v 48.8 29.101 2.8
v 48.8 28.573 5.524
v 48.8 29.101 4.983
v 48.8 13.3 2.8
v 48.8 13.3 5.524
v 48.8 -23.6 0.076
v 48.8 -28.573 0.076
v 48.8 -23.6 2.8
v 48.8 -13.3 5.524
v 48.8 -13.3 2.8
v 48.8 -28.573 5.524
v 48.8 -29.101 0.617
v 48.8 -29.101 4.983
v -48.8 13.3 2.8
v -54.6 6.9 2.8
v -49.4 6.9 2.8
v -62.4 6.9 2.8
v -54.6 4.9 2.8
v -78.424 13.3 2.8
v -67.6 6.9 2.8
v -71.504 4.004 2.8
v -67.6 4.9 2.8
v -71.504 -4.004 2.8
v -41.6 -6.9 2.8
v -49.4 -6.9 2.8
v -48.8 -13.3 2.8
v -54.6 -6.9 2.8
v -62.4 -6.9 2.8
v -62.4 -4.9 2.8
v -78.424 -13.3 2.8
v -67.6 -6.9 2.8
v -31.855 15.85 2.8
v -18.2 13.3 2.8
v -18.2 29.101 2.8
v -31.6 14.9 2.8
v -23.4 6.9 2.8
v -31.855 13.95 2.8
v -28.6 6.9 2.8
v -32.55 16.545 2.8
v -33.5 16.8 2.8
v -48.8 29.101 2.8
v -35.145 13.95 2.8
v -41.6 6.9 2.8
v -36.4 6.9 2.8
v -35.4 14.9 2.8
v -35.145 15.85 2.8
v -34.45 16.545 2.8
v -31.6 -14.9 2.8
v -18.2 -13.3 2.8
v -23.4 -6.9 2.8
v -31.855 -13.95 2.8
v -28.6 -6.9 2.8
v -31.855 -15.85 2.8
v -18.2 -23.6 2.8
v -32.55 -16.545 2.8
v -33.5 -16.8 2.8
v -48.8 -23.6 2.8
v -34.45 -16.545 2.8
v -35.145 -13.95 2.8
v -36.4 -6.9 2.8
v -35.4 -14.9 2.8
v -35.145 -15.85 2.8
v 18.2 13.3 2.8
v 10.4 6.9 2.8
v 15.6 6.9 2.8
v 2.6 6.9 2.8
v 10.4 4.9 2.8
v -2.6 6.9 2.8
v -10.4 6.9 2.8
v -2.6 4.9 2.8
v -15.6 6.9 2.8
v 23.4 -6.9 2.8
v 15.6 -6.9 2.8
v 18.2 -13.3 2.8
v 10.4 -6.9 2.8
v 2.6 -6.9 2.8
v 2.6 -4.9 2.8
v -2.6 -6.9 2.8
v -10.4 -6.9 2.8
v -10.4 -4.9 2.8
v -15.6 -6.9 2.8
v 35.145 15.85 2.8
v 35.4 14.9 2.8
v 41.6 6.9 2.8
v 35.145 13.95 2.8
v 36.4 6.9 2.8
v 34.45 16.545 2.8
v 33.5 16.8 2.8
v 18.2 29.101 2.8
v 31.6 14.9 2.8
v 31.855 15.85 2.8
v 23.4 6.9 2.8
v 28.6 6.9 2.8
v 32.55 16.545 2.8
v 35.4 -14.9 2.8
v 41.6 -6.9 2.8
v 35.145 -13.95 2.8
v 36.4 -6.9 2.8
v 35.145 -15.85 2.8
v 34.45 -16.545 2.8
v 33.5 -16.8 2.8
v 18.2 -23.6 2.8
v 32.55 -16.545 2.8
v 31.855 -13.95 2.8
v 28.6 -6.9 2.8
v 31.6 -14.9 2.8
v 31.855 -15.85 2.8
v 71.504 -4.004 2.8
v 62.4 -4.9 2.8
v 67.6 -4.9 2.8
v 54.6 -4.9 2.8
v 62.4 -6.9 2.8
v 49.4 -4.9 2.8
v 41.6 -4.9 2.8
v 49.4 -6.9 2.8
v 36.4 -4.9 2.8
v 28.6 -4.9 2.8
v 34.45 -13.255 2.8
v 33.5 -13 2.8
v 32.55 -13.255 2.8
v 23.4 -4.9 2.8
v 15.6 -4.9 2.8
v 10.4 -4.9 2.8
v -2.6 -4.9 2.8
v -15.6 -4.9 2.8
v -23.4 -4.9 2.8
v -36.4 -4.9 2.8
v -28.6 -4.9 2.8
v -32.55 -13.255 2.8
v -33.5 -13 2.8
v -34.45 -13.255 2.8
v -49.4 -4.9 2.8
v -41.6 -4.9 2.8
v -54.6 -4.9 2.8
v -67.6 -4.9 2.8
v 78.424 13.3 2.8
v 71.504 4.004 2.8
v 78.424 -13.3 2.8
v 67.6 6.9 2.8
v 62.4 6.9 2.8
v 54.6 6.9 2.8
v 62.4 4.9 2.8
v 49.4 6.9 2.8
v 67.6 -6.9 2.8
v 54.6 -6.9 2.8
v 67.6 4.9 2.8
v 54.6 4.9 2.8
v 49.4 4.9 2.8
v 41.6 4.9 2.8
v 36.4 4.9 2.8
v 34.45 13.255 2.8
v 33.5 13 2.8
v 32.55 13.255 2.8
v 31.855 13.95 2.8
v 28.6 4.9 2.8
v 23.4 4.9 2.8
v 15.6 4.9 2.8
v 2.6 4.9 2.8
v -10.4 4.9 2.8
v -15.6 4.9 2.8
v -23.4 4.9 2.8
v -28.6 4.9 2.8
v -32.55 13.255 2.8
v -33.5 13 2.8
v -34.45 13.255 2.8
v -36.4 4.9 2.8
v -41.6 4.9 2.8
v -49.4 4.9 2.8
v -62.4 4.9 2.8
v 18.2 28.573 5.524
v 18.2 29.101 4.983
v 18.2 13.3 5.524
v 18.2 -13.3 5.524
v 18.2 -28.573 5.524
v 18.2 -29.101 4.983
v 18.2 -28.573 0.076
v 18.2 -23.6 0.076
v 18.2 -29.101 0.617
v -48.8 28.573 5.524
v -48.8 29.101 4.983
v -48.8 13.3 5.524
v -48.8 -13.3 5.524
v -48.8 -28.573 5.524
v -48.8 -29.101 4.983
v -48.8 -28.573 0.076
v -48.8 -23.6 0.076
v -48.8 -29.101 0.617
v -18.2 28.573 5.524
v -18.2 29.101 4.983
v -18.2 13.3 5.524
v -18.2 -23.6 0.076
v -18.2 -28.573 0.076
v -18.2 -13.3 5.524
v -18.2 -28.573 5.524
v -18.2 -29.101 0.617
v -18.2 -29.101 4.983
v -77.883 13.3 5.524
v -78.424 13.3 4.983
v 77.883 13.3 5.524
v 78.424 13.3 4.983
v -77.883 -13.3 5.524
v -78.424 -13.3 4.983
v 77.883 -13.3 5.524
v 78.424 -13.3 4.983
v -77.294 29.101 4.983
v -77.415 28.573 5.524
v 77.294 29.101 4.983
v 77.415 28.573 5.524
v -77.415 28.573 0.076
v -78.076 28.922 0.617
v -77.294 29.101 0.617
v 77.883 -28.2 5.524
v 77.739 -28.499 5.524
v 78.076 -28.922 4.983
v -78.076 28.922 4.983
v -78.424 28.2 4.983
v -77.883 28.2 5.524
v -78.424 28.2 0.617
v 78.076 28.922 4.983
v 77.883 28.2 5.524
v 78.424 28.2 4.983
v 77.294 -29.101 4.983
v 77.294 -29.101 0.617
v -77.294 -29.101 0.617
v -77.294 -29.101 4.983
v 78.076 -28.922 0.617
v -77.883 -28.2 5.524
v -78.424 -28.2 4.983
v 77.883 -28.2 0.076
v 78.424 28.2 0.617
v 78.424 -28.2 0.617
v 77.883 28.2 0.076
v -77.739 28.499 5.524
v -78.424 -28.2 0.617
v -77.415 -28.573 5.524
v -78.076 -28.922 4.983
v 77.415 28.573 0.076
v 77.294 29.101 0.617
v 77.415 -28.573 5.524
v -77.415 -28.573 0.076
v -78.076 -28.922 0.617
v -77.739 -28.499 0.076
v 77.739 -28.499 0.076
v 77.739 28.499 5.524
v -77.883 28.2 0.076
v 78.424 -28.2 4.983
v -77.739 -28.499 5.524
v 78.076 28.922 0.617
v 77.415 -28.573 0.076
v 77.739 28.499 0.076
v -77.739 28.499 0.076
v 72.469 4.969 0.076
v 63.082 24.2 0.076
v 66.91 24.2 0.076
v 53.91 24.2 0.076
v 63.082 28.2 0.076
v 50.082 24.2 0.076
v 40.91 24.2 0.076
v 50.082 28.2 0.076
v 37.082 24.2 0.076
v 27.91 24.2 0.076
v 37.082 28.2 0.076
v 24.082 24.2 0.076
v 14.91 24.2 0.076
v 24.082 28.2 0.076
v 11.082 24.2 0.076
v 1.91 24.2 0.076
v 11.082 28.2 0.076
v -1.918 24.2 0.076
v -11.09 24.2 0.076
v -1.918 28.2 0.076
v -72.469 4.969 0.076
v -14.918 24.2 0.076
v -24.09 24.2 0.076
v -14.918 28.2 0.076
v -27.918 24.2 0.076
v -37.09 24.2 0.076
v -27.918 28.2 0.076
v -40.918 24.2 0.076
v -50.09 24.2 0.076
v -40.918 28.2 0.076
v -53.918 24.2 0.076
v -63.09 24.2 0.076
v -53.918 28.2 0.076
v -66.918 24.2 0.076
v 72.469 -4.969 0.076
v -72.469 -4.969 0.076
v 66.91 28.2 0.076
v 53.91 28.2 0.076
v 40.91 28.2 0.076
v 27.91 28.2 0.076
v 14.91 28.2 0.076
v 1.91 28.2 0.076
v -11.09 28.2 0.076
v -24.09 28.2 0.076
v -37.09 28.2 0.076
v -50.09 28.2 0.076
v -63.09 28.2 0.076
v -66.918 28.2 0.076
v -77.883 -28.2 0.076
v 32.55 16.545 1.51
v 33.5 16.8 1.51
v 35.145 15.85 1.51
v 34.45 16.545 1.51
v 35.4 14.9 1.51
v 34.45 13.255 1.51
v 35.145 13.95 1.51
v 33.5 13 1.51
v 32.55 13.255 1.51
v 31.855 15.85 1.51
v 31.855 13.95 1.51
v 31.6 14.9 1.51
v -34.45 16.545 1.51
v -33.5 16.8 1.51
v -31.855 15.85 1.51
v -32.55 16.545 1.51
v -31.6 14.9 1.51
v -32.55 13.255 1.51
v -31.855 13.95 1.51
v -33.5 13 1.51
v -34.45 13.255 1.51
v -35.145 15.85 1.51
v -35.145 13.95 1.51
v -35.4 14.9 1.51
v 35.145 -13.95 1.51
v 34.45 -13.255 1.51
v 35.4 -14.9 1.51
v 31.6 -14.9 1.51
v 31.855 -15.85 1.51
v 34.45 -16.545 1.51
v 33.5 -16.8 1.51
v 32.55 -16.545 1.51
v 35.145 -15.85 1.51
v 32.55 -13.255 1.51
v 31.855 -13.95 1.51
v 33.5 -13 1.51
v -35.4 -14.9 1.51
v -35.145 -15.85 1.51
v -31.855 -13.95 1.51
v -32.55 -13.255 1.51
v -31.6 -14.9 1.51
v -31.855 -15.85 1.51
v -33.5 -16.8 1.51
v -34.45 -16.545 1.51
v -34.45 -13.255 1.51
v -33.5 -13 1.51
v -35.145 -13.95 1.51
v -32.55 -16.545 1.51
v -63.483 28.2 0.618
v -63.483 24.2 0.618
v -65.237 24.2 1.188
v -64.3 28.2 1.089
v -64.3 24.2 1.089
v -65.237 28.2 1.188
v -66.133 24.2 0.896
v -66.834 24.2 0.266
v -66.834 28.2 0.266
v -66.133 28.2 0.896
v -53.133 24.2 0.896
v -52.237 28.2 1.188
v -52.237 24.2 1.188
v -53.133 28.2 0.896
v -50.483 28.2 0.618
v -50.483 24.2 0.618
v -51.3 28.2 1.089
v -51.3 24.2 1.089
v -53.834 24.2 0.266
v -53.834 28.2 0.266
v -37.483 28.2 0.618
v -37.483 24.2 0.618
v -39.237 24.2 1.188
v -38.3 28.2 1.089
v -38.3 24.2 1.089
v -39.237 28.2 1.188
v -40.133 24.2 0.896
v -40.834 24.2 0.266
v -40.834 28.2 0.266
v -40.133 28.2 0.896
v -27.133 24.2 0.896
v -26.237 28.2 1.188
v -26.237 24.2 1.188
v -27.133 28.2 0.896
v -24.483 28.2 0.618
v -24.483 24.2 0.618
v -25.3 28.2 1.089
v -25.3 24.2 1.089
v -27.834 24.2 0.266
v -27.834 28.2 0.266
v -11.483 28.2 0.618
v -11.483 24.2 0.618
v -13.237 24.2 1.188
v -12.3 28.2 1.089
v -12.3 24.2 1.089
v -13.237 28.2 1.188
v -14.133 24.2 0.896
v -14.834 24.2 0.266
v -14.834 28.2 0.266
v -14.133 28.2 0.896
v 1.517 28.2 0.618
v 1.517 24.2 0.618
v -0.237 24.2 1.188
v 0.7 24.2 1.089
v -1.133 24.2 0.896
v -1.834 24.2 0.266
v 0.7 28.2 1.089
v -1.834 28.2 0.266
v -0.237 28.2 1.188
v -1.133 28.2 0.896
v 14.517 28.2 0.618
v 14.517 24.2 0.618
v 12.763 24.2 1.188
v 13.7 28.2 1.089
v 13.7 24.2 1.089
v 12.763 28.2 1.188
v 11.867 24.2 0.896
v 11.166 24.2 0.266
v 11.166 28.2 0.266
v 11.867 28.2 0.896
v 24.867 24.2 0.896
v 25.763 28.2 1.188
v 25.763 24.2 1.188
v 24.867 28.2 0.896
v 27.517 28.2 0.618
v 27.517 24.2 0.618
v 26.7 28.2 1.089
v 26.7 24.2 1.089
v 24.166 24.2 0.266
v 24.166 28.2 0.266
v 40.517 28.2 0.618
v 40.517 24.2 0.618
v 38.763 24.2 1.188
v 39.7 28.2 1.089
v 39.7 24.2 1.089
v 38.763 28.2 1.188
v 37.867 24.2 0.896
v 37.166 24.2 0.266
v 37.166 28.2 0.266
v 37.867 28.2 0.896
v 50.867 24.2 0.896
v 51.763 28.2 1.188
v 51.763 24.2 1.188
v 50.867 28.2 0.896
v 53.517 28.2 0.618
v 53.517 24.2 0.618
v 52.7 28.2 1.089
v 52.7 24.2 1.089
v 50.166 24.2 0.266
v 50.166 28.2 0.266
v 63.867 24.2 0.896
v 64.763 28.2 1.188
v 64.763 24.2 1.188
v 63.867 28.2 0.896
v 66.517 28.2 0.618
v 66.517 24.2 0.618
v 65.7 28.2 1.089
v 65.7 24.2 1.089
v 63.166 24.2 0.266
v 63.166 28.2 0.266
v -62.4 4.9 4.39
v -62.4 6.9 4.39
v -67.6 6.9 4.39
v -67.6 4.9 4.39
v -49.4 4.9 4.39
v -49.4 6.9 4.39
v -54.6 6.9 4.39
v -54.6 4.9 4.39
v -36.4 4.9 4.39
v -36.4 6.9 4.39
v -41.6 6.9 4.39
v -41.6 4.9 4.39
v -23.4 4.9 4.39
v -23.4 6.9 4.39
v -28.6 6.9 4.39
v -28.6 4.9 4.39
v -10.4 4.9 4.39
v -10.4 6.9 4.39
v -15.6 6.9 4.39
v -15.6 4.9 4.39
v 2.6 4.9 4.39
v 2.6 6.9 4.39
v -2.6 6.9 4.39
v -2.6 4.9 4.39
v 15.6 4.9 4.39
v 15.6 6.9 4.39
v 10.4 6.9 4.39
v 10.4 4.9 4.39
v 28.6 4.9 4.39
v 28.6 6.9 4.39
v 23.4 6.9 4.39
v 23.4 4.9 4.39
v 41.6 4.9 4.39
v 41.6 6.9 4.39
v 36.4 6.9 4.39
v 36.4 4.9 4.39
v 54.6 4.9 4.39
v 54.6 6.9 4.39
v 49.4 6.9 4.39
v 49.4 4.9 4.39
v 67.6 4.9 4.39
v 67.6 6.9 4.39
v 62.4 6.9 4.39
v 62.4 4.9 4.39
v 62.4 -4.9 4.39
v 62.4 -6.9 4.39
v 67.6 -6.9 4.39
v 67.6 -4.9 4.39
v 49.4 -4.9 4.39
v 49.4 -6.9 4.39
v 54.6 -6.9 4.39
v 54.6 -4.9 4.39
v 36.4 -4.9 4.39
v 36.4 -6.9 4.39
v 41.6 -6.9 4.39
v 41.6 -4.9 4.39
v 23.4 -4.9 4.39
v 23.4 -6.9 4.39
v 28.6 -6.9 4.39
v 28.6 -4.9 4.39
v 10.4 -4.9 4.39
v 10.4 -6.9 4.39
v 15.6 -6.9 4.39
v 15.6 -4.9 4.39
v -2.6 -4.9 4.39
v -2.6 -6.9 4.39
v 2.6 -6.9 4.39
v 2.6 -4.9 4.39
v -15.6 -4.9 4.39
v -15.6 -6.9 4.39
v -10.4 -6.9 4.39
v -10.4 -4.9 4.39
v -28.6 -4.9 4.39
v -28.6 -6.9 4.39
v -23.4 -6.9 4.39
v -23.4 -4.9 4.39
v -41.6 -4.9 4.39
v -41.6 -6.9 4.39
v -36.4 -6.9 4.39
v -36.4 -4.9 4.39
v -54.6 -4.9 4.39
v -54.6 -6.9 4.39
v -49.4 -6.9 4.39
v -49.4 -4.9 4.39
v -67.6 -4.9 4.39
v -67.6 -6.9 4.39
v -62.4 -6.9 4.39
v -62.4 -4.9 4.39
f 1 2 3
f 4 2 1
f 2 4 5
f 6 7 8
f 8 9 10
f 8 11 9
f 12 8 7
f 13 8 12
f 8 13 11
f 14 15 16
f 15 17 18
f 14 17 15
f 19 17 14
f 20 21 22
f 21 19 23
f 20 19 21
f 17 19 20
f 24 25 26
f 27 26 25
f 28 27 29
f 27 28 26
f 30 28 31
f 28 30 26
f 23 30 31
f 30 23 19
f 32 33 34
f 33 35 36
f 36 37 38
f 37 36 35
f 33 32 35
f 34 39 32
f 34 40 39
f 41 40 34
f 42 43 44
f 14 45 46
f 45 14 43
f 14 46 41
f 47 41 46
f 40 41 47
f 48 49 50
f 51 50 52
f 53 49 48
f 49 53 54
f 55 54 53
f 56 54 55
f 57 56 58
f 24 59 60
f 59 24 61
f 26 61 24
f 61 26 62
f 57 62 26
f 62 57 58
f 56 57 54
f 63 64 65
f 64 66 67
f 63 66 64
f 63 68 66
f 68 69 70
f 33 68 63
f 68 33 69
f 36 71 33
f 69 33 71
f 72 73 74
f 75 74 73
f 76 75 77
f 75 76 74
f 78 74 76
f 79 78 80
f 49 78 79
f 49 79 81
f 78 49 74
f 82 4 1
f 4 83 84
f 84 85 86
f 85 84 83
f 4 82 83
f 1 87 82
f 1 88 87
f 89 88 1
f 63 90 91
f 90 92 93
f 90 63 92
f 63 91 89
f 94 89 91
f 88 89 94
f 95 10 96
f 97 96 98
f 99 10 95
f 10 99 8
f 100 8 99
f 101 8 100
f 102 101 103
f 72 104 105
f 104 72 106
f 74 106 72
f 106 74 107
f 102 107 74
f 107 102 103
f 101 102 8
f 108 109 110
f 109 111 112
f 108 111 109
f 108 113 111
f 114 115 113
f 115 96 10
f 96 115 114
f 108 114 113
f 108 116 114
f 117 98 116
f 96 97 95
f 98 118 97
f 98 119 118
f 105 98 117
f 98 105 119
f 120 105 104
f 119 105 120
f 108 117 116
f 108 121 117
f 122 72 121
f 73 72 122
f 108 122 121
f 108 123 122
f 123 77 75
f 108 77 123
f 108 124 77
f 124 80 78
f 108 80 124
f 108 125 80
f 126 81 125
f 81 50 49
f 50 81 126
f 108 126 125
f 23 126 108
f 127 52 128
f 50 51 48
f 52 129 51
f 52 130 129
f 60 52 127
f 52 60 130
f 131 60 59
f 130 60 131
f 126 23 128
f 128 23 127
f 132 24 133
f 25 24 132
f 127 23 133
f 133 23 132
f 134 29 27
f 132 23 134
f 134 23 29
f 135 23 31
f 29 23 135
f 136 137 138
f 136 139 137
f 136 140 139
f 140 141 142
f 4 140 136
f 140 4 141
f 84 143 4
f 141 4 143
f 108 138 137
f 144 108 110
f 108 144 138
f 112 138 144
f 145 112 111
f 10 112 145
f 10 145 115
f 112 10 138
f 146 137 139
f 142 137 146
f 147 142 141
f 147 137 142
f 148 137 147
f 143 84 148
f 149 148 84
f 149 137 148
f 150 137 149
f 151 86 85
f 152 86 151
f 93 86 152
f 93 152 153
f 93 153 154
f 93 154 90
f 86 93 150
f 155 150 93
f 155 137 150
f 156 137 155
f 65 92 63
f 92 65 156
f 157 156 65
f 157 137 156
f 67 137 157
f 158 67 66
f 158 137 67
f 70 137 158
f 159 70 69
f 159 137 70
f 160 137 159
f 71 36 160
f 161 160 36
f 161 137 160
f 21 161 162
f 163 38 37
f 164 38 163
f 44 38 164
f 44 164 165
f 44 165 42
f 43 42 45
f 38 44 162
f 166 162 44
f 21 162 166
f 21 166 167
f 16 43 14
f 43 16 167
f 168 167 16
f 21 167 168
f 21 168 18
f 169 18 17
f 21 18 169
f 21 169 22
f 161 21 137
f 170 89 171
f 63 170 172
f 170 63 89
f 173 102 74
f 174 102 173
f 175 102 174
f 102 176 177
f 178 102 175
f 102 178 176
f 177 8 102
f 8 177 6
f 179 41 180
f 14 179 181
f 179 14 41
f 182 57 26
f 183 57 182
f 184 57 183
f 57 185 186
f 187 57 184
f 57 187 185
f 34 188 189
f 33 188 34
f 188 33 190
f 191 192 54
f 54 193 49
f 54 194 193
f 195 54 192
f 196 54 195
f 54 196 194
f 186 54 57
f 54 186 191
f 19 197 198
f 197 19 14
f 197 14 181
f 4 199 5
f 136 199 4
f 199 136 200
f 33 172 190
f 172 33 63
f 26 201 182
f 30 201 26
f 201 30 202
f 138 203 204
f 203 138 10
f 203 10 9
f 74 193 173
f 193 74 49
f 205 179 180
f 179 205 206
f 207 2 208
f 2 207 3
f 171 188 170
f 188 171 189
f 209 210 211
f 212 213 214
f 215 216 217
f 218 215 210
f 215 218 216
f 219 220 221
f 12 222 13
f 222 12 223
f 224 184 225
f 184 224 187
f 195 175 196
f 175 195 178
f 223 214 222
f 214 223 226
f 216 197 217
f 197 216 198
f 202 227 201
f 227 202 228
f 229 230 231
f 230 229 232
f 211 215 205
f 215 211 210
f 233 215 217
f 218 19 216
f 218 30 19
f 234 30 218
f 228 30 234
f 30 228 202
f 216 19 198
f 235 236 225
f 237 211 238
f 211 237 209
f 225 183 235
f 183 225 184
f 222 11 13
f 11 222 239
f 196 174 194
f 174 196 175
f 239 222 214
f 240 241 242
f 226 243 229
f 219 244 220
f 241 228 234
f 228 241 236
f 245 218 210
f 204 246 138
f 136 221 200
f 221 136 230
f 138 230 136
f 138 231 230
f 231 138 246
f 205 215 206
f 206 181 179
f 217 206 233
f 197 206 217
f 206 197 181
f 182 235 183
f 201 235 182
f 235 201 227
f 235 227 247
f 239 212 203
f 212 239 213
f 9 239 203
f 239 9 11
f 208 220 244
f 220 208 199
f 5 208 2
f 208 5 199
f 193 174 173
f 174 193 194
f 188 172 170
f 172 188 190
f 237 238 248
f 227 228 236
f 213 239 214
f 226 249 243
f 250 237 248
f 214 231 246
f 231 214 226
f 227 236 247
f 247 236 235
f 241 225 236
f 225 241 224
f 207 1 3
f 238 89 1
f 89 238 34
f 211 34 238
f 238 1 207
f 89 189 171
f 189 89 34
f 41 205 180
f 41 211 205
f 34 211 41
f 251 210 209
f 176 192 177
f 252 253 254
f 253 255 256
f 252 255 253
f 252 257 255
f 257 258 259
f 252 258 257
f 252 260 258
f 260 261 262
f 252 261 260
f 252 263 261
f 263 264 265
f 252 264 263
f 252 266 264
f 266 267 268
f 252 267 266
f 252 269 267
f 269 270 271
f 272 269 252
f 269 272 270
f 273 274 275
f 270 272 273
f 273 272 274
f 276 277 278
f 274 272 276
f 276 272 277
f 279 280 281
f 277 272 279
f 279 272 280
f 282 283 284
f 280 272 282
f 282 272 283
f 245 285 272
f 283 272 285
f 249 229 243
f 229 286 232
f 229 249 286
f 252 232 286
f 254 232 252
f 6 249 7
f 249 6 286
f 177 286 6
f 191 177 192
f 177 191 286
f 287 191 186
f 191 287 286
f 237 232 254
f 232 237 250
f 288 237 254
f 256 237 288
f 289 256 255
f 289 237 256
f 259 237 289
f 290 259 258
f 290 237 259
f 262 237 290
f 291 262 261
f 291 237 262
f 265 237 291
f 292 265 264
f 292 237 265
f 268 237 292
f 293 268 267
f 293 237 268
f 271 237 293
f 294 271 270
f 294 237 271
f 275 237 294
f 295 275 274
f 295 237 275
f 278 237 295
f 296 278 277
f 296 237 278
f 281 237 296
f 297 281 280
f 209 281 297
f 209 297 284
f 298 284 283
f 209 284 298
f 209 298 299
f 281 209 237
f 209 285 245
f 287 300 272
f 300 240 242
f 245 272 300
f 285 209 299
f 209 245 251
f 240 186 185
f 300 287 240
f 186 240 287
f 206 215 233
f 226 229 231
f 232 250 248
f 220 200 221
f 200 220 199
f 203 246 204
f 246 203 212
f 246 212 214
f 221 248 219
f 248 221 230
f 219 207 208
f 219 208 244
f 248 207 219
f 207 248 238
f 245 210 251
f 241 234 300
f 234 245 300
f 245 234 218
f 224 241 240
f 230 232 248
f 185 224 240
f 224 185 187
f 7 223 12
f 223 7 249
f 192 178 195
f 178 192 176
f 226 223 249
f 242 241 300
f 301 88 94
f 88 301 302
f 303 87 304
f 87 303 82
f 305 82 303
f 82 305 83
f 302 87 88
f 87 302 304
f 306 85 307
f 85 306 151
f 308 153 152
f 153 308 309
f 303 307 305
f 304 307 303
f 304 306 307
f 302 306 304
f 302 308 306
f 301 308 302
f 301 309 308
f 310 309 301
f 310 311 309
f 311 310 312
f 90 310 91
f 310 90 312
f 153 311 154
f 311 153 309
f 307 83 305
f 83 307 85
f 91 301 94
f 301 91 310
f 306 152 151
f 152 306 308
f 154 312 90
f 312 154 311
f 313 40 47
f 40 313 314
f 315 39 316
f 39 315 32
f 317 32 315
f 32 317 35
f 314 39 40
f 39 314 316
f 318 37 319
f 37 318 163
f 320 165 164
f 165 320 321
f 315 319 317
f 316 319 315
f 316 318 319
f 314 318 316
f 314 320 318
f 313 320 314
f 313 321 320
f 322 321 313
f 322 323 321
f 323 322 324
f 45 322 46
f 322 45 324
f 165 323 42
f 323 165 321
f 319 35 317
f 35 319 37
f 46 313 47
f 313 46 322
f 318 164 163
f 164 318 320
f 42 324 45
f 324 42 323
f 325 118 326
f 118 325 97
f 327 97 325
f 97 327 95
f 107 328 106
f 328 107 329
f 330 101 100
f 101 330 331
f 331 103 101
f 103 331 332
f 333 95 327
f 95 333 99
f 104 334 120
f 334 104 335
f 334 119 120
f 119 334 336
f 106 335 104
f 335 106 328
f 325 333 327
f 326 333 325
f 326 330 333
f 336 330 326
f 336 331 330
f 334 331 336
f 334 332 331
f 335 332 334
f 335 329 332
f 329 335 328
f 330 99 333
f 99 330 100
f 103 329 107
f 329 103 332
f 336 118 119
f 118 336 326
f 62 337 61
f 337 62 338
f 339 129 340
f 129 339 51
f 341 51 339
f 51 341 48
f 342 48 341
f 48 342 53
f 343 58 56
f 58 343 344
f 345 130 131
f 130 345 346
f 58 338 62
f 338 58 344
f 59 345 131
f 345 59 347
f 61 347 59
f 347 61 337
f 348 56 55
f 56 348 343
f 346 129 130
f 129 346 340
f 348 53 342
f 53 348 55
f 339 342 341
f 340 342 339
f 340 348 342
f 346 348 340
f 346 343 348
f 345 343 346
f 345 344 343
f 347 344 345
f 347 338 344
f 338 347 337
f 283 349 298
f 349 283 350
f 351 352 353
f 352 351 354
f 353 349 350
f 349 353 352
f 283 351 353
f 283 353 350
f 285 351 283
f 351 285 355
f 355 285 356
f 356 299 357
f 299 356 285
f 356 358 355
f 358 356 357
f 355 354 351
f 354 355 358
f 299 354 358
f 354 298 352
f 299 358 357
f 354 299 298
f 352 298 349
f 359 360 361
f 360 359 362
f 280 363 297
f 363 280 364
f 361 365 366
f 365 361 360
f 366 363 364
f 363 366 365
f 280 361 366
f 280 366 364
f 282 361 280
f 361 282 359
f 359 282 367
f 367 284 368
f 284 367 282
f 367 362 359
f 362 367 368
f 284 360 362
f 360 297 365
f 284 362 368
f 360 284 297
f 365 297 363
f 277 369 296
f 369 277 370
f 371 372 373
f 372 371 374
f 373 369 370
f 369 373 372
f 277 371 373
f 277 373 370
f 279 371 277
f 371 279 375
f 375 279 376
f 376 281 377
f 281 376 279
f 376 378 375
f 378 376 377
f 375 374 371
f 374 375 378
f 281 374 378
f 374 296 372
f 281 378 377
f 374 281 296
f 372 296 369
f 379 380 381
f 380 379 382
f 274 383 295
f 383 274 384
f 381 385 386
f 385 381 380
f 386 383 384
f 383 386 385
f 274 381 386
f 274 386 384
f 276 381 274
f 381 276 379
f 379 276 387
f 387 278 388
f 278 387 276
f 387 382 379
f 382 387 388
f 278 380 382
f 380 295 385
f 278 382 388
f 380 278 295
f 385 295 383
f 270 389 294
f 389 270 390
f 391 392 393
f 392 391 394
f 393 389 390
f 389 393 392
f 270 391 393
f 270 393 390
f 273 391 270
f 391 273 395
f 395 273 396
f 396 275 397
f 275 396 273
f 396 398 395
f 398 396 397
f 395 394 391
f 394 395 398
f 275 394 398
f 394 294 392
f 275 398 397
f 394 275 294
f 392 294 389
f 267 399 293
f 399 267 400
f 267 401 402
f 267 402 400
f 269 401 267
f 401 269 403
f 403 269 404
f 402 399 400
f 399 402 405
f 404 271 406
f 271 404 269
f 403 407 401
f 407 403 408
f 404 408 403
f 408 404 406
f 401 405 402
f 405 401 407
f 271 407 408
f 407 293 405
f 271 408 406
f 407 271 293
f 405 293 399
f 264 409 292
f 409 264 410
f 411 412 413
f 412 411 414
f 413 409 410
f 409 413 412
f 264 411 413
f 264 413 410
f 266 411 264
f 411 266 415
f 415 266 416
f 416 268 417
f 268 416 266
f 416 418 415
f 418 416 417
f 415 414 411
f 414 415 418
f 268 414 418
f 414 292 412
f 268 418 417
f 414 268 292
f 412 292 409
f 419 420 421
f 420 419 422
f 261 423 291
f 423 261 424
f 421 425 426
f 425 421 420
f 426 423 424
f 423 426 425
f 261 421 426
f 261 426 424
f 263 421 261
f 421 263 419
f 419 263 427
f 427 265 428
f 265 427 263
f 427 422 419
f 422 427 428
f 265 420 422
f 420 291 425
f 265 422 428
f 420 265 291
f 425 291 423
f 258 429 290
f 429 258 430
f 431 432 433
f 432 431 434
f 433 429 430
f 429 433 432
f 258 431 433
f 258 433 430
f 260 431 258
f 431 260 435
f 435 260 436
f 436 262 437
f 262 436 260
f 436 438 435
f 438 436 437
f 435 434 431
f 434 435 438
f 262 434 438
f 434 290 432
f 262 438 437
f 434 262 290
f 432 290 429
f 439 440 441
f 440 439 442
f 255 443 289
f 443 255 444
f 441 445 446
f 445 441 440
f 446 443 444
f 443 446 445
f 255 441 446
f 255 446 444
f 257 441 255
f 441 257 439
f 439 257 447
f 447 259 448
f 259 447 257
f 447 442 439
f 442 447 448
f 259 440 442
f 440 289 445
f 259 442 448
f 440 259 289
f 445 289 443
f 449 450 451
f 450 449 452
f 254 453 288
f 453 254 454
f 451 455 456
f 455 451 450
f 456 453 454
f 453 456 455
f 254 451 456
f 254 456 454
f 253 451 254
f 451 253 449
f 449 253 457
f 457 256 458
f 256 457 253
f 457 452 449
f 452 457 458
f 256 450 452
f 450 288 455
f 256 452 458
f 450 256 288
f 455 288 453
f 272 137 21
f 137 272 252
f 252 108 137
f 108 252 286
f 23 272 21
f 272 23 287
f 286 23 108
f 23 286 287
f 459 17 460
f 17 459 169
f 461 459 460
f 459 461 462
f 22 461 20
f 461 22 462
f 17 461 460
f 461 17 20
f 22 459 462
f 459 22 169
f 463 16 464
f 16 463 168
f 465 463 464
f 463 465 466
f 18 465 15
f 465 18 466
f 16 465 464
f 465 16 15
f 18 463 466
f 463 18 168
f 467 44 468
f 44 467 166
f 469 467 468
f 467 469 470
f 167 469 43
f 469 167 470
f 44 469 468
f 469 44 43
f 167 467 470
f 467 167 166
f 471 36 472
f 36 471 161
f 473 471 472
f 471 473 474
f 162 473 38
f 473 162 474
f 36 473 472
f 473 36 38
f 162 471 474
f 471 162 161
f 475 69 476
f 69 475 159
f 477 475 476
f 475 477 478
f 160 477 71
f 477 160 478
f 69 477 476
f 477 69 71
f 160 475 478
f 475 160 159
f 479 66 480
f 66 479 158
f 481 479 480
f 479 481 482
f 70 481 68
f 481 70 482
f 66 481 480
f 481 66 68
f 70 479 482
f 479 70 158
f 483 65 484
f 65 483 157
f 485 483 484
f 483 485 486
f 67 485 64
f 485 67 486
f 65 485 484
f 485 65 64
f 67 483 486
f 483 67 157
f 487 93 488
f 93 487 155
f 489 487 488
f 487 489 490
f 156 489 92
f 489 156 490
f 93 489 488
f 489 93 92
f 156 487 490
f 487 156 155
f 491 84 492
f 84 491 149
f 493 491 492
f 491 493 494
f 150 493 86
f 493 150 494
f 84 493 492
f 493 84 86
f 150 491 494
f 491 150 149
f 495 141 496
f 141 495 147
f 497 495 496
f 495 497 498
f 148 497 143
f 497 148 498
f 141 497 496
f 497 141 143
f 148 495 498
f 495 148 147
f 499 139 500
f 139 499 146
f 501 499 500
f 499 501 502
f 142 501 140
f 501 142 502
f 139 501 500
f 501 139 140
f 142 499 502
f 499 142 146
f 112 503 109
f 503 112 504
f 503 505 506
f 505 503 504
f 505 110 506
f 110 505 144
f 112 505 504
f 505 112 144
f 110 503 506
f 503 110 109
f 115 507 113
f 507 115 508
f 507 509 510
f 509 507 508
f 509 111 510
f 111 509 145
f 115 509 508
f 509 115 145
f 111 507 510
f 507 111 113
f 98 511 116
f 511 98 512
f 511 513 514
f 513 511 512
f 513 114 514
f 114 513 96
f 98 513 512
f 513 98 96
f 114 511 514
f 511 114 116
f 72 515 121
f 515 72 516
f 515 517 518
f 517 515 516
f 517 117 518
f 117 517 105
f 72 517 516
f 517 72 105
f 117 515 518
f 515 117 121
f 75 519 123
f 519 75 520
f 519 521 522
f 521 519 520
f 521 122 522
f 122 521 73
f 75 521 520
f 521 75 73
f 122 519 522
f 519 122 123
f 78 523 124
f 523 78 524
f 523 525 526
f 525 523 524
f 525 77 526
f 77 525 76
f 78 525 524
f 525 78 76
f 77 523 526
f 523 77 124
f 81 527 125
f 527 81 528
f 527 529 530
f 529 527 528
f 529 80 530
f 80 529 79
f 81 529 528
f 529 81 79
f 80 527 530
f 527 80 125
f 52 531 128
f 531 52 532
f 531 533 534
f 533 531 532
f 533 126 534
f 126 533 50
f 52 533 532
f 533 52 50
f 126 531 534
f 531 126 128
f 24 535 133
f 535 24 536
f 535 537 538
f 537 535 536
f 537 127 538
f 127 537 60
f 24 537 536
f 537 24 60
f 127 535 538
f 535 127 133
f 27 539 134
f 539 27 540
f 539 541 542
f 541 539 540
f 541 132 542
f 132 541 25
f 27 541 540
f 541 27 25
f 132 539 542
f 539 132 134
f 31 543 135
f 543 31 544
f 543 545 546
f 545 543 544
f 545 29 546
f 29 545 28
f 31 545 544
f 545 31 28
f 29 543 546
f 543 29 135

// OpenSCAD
// -*- mode: SCAD ; c-file-style: "ellemtel" ; coding: utf-8 -*-
//
// Holder to scan Minox film strips with a Reflecta ProScan 10T
//
// Copyright 2018 Roland Sieker <ospalh@gmail.com>
// Licence: CC-BY-SA 4.0


/* [Global] */


// ... to preview. You will get both parts when you click "Create Thing".
part = "halter"; // [halter: film holder, einsatz: film holder clamp]

// Set this to "render" and click on "Create Thing" when done with the setup.
preview = 1; // [0:render, 1:preview]

/* [Holder] */

// Width of the holder. This one and the next one are the two values you do need to set up for your scanner. Preset is for a Reflecta proScan. Maybe subtract half a millimtre for a better fit.
holder_width = 58.4;  // [20:0.1:150]

// Height or thickness of the holder. See above. You know they were too high when you need a mallet to go from one image to the next...
holder_thickness = 5.6;  // [3:0.1:10]

// How many exposures on the longest strips you want to fit into this. Make sure the resulting holder still fits onto your print bed.
images_per_strip = 11;  // [1:1:20]

/* [Magnets] */

// Diameter of the magnet hole. Add clearance by hand here. Set to 0 for no magnet holes.
magnet_diameter = 3.8;  // [0:0.1:15]
// Height or thickness of the magnet. Make sure to use magnets flat enough to fit.
magnet_height = 1;  // [0.5:0.1:3]

/* [Hidden] */

// Das ganze Filmgroessen-Geraffel wieder verstecken: ein thing pro
// Film. Teil der Automatik (mit/ohne Stege, Lang-oder Kurzkerbe) sind so
// halbwegs inaktiv.


// Width of the film
film_width = 9.2;  // [8:0.1:70]
// Length from the left edge of an exposure to its right edge
image_width = 13; // [8:0.1:100]
// Length from one point (e.g. left edge) of one exposure to the same point of the next exposure. This minus the image width is used for the vertical ridges, if it's positive.
image_pitch = 13; // [0:0.1:110]
// Size of an exposure from bottom to top.
image_height = 8; // [7:0.1:68]


bildabstand = max(image_pitch, image_width);
l_filmsteg = max(0, bildabstand-image_width);

r_r = 1.0;  // Rundungsradius

// Auch wichtig:
l_zk = 4;  // Laenge Zentrierkerbe
b_zk = 4;  // Breite Zentrierkerbe
h_zk = 1.2;  // Tiefe der Zentrierkerbe
w_zk = 1;  // Wand bzw Abstand der Zentrierkerbe vom Rand



l_griff = 30;
o_griff = 30;
w_griff = 5;
magnet_y_off = 0;  // Abstand Magnet vom Einsatz

kurzsteg_grenze = 1;  // Weniger als 1 mm pro Seite: Kurzstege

mit_langsteg = ( ((film_width-image_height)/2) >= kurzsteg_grenze);


w_steg = 2;  // Breite fuer Stuecke, die den Film zentrieren.
l_kurzsteg = 0.4*bildabstand;  // Laenge fuer Stuecke, die den Film zentrieren,
// wenn wier keine Fensterstege machen



w_schraeg = 1;  // Breite der Abschraegung rund um die Filmfenster




// *******************************************************
// Extra parameters. These can be changed reasonably safely.


w = 1.8;  // Wall width
p = 1.2;  // Bottom, top plate height
c = 0.6;  // Clearance
c_z = 0.3;  // Clearance in z direction. Mostly for the magnet hole and centering ridge
angle = 60; // Overhangs much below 60 degrees are a problem for me


// Halbwegs wichtig
h_steg = 1.6;  // Hoehe fuer Stuecke, die den Film zentrieren.
h_nut = h_steg + c_z;  // Tiefe fuer Stuecke, auf denen der Film nicht aufliegt



// *******************************************************
// Some shortcuts. These shouldn't be changed

tau = 2 * PI;  // pi is still wrong. tau = circumference / r

xy_factor = 1/tan(angle);
// To get from a height to a horizontal width inclined correctly
z_factor = tan(angle);  // The other way around

some_distance = 1.2 * holder_width;
ms = 0.01;  // Muggeseggele.

// fn for differently sized objects and fs, fa; all for preview or rendering.
pna = 40;
pnb = 15;
pa = 5;
ps = 1;
rna = 180;
rnb = 30;
ra = 1;
rs = 0.1;
function na() = (preview) ? pna : rna;
function nb() = (preview) ? pnb : rnb;
$fs = (preview) ? ps : rs;
$fa = (preview) ? pa : ra;

l_fenster = bildabstand * images_per_strip;
l_rand = 2 * w_steg + w_schraeg + 2;
w_rand = w_schraeg + 8;
l_ue_a =  l_fenster + 2*l_rand;
w_einsatz = image_height + 2 * w_rand;
h_bd = holder_thickness/2;  // Hoehe Boden oder Deckel

to_griff = l_ue_a/2 - o_griff - l_griff/2;



// *******************************************************
// End setup




// *******************************************************
// Generate the parts


print_part();
// filmhalter();
// einsatz();
// preview_parts();
// stack_parts();



module print_part()
{
   if ("halter" == part)
   {
      filmhalter();
   }
   if ("einsatz" == part)
   {
      einsatz();
   }
}

module preview_parts()
{
   filmhalter();
   translate([0, some_distance, 0])
   {
      einsatz();
   }
}

module stack_parts()
{
   // intersection()
   {
       // color("yellow")
      {
         filmhalter();
      }
      translate([0,0,holder_thickness + ms])
      {
         rotate([0,180,0])
         {
            // color("red")
            {
               einsatz();
            }
         }
      }
   }
}

// *******************************************************
// Code for the parts themselves


module filmhalter()
{
   difference()
   {
      basis_filmhalter();
      fenster();
      magnetausschnitte();
      kerben();
   }
   fensterstege();
   bodenstege();
}

module einsatz()
{
   difference()
   {
      union()
      {
         difference()
         {
            basis_einsatz();
            fenster();
         }
         fensterstege();
      }
      einsatzausschnitte();
      // magnetausschnitte(magnet_diameter/2);
      magnetausschnitte();
   }

}


module basis_filmhalter()
{
   translate([0,0,h_bd])
   {
      difference()
      {
         massiver_halter();
         einsatz_ausschnitt(c);
      }
   }
}


module basis_einsatz()
{
   translate([0,0,h_bd])
   {
      intersection()
      {
         massiver_halter();
         rotate([0,180,0])
         {
            einsatz_ausschnitt(0);
         }
      }
   }

}

module massiver_halter()
{
   hull()
   {
      vosp();
      mirror([0,0,1])
      {
         vosp();
      }
   }

   module vosp()
   {
      tosp();
      mirror([0,1,0])
      {
         tosp();
      }
   }
   module tosp()
   {
      osp();
      mirror([1,0,0])
      {
         osp();
      }

   }

   module osp()
   {
      translate([l_ue_a/2-r_r, holder_width/2-r_r, holder_thickness/2-r_r])
      {
         sphere(r=r_r);
      }
   }
}


module einsatz_ausschnitt(ec)
{
   translate([0, 0, holder_thickness])
   {
      cube([l_ue_a+2*ms, w_einsatz + ec, 2*holder_thickness], center=true);
      grip_cut();
      mirror()
      {
         grip_cut();
      }
   }
   module grip_cut()
   {
      translate([to_griff, 0, 0])
      {
         cube([l_griff + ec, holder_width + 2*ms, 2*holder_thickness], center=true);
         translate([0, -holder_width/2, 0])
         {
            cube([l_griff + ec, 2*w_griff+2*ec, 4*holder_thickness], center=true);
         }
      }
   }
}

module fenster()
{
   translate([0, 0, h_bd])
   {
      hull()
      {
         translate([0,0,-0.5+ms])
         {
            cube([l_fenster, image_height, 1], center=true);
         }
         translate([0,0,-h_bd-0.5-ms])
         {
            cube(
               [l_fenster+2*w_schraeg, image_height+2*w_schraeg, 1], center=true);
         }
      }

   }
}


module magnetausschnitte()
{
   if (magnet_diameter > 0 && magnet_height > 0)
   {
      magnetausschnitt(1, 1);
      magnetausschnitt(-1, 1);
      magnetausschnitt(1, -1);
      magnetausschnitt(-1, -1);
   }
}

module magnetausschnitt(xf, yf)
{
   yo_mag = w_einsatz/2 + magnet_diameter/2 +magnet_y_off;


   // Mittig in den Griffen.
   translate(
      [xf * (to_griff), yf * (yo_mag), h_bd - magnet_height-c_z + ms])
   {
      cylinder(d=magnet_diameter, h=magnet_height+c_z);  // N.B. Spiel ist schon im magnet_diameter
      // eingerechnet
   }
}

module bodenstege()
{
   translate([0, 0, -ms+h_steg/2+h_bd])
   {
      if (mit_langsteg)
      {
         langbodensteg();
         rotate(180)
         {
            langbodensteg();
         }
      }
      else
      {
         kurzbodenstege();
         rotate(180)
         {
            kurzbodenstege();
         }
      }
   }
   module langbodensteg()
   {
      translate([0,w_steg/2+film_width/2+c/2, 0])
      {
         cube([l_fenster, w_steg, h_steg], center=true);
      }
   }
   module kurzbodenstege()
   {
      for (i=[0:images_per_strip-1])
      {
         translate([-l_fenster/2 + (0.5 + i) * bildabstand, w_steg/2+film_width/2+c/2, 0])
         {
            cube([l_kurzsteg, w_steg, h_steg], center=true);
         }
      }
   }
}

module einsatzausschnitte()
{
   translate([0, 0, h_bd + ms-h_nut/2])
   {
      if (mit_langsteg)
      {
         langausschnitt();
         rotate(180)
         {
            langausschnitt();
         }
      }
      else
      {
         kurzausschnitte();
         rotate(180)
         {
            kurzausschnitte();
         }
      }
   }
   module langausschnitt()
   {
      translate([0,w_steg/2+film_width/2+c/2,0])
      {
         cube([l_fenster+6*c, w_steg+2*c, h_nut], center=true);
      }
   }
   module kurzausschnitte()
   {
      for (i=[0:images_per_strip-1])
      {
         translate([-l_fenster/2 + (0.5 + i) * bildabstand, w_steg/2+film_width/2+c/2-film_width/4 + image_height/4, 0])
         {
            cube([l_kurzsteg+2*c, w_steg+2*c+film_width/2 - image_height/2, h_nut], center=true);
         }
      }
   }
}


module fensterstege()
{
   if (l_filmsteg > 0)
   {
      for (i=[1:images_per_strip-1])
      {
         translate([-l_fenster/2 + i * bildabstand, 0, h_bd/2-ms])
         {
            cube([l_filmsteg, image_height+2*w_schraeg + 2*ms ,h_bd], center=true);
         }
      }
   }
}

module kerben()
{
   // Den Radius der Zentrierkerbe kann mensch per Pythagoras bestimmen.
   // Hypothenuse = r_zk
   // 1. Kathete = l_zk/2
   // 2. Kathete = r_zk - h_zk
   // h_zk > 0
   // r_zk * r_zk = l_zk * l_zk / 4 + r_zk * r_zk - 2 * r_zk * h_zk + h_zk * h_zk
   // 0 = l_zk * l_zk / 4 - 2 * r_zk * h_zk + h_zk * h_zk
   // 2 * r_zk * h_zk =
   r_zk = (l_zk * l_zk / 4 + h_zk * h_zk) / (2 * h_zk);
   for (i=[0:images_per_strip-1])
   {
      translate(
         [-l_fenster/2 + i * bildabstand + bildabstand/2, holder_width/2 - w_zk, h_zk-r_zk])
      {
         rotate([90,0,0])
         {
            cylinder(r=r_zk, h=b_zk);
         }
      }
   }

}
